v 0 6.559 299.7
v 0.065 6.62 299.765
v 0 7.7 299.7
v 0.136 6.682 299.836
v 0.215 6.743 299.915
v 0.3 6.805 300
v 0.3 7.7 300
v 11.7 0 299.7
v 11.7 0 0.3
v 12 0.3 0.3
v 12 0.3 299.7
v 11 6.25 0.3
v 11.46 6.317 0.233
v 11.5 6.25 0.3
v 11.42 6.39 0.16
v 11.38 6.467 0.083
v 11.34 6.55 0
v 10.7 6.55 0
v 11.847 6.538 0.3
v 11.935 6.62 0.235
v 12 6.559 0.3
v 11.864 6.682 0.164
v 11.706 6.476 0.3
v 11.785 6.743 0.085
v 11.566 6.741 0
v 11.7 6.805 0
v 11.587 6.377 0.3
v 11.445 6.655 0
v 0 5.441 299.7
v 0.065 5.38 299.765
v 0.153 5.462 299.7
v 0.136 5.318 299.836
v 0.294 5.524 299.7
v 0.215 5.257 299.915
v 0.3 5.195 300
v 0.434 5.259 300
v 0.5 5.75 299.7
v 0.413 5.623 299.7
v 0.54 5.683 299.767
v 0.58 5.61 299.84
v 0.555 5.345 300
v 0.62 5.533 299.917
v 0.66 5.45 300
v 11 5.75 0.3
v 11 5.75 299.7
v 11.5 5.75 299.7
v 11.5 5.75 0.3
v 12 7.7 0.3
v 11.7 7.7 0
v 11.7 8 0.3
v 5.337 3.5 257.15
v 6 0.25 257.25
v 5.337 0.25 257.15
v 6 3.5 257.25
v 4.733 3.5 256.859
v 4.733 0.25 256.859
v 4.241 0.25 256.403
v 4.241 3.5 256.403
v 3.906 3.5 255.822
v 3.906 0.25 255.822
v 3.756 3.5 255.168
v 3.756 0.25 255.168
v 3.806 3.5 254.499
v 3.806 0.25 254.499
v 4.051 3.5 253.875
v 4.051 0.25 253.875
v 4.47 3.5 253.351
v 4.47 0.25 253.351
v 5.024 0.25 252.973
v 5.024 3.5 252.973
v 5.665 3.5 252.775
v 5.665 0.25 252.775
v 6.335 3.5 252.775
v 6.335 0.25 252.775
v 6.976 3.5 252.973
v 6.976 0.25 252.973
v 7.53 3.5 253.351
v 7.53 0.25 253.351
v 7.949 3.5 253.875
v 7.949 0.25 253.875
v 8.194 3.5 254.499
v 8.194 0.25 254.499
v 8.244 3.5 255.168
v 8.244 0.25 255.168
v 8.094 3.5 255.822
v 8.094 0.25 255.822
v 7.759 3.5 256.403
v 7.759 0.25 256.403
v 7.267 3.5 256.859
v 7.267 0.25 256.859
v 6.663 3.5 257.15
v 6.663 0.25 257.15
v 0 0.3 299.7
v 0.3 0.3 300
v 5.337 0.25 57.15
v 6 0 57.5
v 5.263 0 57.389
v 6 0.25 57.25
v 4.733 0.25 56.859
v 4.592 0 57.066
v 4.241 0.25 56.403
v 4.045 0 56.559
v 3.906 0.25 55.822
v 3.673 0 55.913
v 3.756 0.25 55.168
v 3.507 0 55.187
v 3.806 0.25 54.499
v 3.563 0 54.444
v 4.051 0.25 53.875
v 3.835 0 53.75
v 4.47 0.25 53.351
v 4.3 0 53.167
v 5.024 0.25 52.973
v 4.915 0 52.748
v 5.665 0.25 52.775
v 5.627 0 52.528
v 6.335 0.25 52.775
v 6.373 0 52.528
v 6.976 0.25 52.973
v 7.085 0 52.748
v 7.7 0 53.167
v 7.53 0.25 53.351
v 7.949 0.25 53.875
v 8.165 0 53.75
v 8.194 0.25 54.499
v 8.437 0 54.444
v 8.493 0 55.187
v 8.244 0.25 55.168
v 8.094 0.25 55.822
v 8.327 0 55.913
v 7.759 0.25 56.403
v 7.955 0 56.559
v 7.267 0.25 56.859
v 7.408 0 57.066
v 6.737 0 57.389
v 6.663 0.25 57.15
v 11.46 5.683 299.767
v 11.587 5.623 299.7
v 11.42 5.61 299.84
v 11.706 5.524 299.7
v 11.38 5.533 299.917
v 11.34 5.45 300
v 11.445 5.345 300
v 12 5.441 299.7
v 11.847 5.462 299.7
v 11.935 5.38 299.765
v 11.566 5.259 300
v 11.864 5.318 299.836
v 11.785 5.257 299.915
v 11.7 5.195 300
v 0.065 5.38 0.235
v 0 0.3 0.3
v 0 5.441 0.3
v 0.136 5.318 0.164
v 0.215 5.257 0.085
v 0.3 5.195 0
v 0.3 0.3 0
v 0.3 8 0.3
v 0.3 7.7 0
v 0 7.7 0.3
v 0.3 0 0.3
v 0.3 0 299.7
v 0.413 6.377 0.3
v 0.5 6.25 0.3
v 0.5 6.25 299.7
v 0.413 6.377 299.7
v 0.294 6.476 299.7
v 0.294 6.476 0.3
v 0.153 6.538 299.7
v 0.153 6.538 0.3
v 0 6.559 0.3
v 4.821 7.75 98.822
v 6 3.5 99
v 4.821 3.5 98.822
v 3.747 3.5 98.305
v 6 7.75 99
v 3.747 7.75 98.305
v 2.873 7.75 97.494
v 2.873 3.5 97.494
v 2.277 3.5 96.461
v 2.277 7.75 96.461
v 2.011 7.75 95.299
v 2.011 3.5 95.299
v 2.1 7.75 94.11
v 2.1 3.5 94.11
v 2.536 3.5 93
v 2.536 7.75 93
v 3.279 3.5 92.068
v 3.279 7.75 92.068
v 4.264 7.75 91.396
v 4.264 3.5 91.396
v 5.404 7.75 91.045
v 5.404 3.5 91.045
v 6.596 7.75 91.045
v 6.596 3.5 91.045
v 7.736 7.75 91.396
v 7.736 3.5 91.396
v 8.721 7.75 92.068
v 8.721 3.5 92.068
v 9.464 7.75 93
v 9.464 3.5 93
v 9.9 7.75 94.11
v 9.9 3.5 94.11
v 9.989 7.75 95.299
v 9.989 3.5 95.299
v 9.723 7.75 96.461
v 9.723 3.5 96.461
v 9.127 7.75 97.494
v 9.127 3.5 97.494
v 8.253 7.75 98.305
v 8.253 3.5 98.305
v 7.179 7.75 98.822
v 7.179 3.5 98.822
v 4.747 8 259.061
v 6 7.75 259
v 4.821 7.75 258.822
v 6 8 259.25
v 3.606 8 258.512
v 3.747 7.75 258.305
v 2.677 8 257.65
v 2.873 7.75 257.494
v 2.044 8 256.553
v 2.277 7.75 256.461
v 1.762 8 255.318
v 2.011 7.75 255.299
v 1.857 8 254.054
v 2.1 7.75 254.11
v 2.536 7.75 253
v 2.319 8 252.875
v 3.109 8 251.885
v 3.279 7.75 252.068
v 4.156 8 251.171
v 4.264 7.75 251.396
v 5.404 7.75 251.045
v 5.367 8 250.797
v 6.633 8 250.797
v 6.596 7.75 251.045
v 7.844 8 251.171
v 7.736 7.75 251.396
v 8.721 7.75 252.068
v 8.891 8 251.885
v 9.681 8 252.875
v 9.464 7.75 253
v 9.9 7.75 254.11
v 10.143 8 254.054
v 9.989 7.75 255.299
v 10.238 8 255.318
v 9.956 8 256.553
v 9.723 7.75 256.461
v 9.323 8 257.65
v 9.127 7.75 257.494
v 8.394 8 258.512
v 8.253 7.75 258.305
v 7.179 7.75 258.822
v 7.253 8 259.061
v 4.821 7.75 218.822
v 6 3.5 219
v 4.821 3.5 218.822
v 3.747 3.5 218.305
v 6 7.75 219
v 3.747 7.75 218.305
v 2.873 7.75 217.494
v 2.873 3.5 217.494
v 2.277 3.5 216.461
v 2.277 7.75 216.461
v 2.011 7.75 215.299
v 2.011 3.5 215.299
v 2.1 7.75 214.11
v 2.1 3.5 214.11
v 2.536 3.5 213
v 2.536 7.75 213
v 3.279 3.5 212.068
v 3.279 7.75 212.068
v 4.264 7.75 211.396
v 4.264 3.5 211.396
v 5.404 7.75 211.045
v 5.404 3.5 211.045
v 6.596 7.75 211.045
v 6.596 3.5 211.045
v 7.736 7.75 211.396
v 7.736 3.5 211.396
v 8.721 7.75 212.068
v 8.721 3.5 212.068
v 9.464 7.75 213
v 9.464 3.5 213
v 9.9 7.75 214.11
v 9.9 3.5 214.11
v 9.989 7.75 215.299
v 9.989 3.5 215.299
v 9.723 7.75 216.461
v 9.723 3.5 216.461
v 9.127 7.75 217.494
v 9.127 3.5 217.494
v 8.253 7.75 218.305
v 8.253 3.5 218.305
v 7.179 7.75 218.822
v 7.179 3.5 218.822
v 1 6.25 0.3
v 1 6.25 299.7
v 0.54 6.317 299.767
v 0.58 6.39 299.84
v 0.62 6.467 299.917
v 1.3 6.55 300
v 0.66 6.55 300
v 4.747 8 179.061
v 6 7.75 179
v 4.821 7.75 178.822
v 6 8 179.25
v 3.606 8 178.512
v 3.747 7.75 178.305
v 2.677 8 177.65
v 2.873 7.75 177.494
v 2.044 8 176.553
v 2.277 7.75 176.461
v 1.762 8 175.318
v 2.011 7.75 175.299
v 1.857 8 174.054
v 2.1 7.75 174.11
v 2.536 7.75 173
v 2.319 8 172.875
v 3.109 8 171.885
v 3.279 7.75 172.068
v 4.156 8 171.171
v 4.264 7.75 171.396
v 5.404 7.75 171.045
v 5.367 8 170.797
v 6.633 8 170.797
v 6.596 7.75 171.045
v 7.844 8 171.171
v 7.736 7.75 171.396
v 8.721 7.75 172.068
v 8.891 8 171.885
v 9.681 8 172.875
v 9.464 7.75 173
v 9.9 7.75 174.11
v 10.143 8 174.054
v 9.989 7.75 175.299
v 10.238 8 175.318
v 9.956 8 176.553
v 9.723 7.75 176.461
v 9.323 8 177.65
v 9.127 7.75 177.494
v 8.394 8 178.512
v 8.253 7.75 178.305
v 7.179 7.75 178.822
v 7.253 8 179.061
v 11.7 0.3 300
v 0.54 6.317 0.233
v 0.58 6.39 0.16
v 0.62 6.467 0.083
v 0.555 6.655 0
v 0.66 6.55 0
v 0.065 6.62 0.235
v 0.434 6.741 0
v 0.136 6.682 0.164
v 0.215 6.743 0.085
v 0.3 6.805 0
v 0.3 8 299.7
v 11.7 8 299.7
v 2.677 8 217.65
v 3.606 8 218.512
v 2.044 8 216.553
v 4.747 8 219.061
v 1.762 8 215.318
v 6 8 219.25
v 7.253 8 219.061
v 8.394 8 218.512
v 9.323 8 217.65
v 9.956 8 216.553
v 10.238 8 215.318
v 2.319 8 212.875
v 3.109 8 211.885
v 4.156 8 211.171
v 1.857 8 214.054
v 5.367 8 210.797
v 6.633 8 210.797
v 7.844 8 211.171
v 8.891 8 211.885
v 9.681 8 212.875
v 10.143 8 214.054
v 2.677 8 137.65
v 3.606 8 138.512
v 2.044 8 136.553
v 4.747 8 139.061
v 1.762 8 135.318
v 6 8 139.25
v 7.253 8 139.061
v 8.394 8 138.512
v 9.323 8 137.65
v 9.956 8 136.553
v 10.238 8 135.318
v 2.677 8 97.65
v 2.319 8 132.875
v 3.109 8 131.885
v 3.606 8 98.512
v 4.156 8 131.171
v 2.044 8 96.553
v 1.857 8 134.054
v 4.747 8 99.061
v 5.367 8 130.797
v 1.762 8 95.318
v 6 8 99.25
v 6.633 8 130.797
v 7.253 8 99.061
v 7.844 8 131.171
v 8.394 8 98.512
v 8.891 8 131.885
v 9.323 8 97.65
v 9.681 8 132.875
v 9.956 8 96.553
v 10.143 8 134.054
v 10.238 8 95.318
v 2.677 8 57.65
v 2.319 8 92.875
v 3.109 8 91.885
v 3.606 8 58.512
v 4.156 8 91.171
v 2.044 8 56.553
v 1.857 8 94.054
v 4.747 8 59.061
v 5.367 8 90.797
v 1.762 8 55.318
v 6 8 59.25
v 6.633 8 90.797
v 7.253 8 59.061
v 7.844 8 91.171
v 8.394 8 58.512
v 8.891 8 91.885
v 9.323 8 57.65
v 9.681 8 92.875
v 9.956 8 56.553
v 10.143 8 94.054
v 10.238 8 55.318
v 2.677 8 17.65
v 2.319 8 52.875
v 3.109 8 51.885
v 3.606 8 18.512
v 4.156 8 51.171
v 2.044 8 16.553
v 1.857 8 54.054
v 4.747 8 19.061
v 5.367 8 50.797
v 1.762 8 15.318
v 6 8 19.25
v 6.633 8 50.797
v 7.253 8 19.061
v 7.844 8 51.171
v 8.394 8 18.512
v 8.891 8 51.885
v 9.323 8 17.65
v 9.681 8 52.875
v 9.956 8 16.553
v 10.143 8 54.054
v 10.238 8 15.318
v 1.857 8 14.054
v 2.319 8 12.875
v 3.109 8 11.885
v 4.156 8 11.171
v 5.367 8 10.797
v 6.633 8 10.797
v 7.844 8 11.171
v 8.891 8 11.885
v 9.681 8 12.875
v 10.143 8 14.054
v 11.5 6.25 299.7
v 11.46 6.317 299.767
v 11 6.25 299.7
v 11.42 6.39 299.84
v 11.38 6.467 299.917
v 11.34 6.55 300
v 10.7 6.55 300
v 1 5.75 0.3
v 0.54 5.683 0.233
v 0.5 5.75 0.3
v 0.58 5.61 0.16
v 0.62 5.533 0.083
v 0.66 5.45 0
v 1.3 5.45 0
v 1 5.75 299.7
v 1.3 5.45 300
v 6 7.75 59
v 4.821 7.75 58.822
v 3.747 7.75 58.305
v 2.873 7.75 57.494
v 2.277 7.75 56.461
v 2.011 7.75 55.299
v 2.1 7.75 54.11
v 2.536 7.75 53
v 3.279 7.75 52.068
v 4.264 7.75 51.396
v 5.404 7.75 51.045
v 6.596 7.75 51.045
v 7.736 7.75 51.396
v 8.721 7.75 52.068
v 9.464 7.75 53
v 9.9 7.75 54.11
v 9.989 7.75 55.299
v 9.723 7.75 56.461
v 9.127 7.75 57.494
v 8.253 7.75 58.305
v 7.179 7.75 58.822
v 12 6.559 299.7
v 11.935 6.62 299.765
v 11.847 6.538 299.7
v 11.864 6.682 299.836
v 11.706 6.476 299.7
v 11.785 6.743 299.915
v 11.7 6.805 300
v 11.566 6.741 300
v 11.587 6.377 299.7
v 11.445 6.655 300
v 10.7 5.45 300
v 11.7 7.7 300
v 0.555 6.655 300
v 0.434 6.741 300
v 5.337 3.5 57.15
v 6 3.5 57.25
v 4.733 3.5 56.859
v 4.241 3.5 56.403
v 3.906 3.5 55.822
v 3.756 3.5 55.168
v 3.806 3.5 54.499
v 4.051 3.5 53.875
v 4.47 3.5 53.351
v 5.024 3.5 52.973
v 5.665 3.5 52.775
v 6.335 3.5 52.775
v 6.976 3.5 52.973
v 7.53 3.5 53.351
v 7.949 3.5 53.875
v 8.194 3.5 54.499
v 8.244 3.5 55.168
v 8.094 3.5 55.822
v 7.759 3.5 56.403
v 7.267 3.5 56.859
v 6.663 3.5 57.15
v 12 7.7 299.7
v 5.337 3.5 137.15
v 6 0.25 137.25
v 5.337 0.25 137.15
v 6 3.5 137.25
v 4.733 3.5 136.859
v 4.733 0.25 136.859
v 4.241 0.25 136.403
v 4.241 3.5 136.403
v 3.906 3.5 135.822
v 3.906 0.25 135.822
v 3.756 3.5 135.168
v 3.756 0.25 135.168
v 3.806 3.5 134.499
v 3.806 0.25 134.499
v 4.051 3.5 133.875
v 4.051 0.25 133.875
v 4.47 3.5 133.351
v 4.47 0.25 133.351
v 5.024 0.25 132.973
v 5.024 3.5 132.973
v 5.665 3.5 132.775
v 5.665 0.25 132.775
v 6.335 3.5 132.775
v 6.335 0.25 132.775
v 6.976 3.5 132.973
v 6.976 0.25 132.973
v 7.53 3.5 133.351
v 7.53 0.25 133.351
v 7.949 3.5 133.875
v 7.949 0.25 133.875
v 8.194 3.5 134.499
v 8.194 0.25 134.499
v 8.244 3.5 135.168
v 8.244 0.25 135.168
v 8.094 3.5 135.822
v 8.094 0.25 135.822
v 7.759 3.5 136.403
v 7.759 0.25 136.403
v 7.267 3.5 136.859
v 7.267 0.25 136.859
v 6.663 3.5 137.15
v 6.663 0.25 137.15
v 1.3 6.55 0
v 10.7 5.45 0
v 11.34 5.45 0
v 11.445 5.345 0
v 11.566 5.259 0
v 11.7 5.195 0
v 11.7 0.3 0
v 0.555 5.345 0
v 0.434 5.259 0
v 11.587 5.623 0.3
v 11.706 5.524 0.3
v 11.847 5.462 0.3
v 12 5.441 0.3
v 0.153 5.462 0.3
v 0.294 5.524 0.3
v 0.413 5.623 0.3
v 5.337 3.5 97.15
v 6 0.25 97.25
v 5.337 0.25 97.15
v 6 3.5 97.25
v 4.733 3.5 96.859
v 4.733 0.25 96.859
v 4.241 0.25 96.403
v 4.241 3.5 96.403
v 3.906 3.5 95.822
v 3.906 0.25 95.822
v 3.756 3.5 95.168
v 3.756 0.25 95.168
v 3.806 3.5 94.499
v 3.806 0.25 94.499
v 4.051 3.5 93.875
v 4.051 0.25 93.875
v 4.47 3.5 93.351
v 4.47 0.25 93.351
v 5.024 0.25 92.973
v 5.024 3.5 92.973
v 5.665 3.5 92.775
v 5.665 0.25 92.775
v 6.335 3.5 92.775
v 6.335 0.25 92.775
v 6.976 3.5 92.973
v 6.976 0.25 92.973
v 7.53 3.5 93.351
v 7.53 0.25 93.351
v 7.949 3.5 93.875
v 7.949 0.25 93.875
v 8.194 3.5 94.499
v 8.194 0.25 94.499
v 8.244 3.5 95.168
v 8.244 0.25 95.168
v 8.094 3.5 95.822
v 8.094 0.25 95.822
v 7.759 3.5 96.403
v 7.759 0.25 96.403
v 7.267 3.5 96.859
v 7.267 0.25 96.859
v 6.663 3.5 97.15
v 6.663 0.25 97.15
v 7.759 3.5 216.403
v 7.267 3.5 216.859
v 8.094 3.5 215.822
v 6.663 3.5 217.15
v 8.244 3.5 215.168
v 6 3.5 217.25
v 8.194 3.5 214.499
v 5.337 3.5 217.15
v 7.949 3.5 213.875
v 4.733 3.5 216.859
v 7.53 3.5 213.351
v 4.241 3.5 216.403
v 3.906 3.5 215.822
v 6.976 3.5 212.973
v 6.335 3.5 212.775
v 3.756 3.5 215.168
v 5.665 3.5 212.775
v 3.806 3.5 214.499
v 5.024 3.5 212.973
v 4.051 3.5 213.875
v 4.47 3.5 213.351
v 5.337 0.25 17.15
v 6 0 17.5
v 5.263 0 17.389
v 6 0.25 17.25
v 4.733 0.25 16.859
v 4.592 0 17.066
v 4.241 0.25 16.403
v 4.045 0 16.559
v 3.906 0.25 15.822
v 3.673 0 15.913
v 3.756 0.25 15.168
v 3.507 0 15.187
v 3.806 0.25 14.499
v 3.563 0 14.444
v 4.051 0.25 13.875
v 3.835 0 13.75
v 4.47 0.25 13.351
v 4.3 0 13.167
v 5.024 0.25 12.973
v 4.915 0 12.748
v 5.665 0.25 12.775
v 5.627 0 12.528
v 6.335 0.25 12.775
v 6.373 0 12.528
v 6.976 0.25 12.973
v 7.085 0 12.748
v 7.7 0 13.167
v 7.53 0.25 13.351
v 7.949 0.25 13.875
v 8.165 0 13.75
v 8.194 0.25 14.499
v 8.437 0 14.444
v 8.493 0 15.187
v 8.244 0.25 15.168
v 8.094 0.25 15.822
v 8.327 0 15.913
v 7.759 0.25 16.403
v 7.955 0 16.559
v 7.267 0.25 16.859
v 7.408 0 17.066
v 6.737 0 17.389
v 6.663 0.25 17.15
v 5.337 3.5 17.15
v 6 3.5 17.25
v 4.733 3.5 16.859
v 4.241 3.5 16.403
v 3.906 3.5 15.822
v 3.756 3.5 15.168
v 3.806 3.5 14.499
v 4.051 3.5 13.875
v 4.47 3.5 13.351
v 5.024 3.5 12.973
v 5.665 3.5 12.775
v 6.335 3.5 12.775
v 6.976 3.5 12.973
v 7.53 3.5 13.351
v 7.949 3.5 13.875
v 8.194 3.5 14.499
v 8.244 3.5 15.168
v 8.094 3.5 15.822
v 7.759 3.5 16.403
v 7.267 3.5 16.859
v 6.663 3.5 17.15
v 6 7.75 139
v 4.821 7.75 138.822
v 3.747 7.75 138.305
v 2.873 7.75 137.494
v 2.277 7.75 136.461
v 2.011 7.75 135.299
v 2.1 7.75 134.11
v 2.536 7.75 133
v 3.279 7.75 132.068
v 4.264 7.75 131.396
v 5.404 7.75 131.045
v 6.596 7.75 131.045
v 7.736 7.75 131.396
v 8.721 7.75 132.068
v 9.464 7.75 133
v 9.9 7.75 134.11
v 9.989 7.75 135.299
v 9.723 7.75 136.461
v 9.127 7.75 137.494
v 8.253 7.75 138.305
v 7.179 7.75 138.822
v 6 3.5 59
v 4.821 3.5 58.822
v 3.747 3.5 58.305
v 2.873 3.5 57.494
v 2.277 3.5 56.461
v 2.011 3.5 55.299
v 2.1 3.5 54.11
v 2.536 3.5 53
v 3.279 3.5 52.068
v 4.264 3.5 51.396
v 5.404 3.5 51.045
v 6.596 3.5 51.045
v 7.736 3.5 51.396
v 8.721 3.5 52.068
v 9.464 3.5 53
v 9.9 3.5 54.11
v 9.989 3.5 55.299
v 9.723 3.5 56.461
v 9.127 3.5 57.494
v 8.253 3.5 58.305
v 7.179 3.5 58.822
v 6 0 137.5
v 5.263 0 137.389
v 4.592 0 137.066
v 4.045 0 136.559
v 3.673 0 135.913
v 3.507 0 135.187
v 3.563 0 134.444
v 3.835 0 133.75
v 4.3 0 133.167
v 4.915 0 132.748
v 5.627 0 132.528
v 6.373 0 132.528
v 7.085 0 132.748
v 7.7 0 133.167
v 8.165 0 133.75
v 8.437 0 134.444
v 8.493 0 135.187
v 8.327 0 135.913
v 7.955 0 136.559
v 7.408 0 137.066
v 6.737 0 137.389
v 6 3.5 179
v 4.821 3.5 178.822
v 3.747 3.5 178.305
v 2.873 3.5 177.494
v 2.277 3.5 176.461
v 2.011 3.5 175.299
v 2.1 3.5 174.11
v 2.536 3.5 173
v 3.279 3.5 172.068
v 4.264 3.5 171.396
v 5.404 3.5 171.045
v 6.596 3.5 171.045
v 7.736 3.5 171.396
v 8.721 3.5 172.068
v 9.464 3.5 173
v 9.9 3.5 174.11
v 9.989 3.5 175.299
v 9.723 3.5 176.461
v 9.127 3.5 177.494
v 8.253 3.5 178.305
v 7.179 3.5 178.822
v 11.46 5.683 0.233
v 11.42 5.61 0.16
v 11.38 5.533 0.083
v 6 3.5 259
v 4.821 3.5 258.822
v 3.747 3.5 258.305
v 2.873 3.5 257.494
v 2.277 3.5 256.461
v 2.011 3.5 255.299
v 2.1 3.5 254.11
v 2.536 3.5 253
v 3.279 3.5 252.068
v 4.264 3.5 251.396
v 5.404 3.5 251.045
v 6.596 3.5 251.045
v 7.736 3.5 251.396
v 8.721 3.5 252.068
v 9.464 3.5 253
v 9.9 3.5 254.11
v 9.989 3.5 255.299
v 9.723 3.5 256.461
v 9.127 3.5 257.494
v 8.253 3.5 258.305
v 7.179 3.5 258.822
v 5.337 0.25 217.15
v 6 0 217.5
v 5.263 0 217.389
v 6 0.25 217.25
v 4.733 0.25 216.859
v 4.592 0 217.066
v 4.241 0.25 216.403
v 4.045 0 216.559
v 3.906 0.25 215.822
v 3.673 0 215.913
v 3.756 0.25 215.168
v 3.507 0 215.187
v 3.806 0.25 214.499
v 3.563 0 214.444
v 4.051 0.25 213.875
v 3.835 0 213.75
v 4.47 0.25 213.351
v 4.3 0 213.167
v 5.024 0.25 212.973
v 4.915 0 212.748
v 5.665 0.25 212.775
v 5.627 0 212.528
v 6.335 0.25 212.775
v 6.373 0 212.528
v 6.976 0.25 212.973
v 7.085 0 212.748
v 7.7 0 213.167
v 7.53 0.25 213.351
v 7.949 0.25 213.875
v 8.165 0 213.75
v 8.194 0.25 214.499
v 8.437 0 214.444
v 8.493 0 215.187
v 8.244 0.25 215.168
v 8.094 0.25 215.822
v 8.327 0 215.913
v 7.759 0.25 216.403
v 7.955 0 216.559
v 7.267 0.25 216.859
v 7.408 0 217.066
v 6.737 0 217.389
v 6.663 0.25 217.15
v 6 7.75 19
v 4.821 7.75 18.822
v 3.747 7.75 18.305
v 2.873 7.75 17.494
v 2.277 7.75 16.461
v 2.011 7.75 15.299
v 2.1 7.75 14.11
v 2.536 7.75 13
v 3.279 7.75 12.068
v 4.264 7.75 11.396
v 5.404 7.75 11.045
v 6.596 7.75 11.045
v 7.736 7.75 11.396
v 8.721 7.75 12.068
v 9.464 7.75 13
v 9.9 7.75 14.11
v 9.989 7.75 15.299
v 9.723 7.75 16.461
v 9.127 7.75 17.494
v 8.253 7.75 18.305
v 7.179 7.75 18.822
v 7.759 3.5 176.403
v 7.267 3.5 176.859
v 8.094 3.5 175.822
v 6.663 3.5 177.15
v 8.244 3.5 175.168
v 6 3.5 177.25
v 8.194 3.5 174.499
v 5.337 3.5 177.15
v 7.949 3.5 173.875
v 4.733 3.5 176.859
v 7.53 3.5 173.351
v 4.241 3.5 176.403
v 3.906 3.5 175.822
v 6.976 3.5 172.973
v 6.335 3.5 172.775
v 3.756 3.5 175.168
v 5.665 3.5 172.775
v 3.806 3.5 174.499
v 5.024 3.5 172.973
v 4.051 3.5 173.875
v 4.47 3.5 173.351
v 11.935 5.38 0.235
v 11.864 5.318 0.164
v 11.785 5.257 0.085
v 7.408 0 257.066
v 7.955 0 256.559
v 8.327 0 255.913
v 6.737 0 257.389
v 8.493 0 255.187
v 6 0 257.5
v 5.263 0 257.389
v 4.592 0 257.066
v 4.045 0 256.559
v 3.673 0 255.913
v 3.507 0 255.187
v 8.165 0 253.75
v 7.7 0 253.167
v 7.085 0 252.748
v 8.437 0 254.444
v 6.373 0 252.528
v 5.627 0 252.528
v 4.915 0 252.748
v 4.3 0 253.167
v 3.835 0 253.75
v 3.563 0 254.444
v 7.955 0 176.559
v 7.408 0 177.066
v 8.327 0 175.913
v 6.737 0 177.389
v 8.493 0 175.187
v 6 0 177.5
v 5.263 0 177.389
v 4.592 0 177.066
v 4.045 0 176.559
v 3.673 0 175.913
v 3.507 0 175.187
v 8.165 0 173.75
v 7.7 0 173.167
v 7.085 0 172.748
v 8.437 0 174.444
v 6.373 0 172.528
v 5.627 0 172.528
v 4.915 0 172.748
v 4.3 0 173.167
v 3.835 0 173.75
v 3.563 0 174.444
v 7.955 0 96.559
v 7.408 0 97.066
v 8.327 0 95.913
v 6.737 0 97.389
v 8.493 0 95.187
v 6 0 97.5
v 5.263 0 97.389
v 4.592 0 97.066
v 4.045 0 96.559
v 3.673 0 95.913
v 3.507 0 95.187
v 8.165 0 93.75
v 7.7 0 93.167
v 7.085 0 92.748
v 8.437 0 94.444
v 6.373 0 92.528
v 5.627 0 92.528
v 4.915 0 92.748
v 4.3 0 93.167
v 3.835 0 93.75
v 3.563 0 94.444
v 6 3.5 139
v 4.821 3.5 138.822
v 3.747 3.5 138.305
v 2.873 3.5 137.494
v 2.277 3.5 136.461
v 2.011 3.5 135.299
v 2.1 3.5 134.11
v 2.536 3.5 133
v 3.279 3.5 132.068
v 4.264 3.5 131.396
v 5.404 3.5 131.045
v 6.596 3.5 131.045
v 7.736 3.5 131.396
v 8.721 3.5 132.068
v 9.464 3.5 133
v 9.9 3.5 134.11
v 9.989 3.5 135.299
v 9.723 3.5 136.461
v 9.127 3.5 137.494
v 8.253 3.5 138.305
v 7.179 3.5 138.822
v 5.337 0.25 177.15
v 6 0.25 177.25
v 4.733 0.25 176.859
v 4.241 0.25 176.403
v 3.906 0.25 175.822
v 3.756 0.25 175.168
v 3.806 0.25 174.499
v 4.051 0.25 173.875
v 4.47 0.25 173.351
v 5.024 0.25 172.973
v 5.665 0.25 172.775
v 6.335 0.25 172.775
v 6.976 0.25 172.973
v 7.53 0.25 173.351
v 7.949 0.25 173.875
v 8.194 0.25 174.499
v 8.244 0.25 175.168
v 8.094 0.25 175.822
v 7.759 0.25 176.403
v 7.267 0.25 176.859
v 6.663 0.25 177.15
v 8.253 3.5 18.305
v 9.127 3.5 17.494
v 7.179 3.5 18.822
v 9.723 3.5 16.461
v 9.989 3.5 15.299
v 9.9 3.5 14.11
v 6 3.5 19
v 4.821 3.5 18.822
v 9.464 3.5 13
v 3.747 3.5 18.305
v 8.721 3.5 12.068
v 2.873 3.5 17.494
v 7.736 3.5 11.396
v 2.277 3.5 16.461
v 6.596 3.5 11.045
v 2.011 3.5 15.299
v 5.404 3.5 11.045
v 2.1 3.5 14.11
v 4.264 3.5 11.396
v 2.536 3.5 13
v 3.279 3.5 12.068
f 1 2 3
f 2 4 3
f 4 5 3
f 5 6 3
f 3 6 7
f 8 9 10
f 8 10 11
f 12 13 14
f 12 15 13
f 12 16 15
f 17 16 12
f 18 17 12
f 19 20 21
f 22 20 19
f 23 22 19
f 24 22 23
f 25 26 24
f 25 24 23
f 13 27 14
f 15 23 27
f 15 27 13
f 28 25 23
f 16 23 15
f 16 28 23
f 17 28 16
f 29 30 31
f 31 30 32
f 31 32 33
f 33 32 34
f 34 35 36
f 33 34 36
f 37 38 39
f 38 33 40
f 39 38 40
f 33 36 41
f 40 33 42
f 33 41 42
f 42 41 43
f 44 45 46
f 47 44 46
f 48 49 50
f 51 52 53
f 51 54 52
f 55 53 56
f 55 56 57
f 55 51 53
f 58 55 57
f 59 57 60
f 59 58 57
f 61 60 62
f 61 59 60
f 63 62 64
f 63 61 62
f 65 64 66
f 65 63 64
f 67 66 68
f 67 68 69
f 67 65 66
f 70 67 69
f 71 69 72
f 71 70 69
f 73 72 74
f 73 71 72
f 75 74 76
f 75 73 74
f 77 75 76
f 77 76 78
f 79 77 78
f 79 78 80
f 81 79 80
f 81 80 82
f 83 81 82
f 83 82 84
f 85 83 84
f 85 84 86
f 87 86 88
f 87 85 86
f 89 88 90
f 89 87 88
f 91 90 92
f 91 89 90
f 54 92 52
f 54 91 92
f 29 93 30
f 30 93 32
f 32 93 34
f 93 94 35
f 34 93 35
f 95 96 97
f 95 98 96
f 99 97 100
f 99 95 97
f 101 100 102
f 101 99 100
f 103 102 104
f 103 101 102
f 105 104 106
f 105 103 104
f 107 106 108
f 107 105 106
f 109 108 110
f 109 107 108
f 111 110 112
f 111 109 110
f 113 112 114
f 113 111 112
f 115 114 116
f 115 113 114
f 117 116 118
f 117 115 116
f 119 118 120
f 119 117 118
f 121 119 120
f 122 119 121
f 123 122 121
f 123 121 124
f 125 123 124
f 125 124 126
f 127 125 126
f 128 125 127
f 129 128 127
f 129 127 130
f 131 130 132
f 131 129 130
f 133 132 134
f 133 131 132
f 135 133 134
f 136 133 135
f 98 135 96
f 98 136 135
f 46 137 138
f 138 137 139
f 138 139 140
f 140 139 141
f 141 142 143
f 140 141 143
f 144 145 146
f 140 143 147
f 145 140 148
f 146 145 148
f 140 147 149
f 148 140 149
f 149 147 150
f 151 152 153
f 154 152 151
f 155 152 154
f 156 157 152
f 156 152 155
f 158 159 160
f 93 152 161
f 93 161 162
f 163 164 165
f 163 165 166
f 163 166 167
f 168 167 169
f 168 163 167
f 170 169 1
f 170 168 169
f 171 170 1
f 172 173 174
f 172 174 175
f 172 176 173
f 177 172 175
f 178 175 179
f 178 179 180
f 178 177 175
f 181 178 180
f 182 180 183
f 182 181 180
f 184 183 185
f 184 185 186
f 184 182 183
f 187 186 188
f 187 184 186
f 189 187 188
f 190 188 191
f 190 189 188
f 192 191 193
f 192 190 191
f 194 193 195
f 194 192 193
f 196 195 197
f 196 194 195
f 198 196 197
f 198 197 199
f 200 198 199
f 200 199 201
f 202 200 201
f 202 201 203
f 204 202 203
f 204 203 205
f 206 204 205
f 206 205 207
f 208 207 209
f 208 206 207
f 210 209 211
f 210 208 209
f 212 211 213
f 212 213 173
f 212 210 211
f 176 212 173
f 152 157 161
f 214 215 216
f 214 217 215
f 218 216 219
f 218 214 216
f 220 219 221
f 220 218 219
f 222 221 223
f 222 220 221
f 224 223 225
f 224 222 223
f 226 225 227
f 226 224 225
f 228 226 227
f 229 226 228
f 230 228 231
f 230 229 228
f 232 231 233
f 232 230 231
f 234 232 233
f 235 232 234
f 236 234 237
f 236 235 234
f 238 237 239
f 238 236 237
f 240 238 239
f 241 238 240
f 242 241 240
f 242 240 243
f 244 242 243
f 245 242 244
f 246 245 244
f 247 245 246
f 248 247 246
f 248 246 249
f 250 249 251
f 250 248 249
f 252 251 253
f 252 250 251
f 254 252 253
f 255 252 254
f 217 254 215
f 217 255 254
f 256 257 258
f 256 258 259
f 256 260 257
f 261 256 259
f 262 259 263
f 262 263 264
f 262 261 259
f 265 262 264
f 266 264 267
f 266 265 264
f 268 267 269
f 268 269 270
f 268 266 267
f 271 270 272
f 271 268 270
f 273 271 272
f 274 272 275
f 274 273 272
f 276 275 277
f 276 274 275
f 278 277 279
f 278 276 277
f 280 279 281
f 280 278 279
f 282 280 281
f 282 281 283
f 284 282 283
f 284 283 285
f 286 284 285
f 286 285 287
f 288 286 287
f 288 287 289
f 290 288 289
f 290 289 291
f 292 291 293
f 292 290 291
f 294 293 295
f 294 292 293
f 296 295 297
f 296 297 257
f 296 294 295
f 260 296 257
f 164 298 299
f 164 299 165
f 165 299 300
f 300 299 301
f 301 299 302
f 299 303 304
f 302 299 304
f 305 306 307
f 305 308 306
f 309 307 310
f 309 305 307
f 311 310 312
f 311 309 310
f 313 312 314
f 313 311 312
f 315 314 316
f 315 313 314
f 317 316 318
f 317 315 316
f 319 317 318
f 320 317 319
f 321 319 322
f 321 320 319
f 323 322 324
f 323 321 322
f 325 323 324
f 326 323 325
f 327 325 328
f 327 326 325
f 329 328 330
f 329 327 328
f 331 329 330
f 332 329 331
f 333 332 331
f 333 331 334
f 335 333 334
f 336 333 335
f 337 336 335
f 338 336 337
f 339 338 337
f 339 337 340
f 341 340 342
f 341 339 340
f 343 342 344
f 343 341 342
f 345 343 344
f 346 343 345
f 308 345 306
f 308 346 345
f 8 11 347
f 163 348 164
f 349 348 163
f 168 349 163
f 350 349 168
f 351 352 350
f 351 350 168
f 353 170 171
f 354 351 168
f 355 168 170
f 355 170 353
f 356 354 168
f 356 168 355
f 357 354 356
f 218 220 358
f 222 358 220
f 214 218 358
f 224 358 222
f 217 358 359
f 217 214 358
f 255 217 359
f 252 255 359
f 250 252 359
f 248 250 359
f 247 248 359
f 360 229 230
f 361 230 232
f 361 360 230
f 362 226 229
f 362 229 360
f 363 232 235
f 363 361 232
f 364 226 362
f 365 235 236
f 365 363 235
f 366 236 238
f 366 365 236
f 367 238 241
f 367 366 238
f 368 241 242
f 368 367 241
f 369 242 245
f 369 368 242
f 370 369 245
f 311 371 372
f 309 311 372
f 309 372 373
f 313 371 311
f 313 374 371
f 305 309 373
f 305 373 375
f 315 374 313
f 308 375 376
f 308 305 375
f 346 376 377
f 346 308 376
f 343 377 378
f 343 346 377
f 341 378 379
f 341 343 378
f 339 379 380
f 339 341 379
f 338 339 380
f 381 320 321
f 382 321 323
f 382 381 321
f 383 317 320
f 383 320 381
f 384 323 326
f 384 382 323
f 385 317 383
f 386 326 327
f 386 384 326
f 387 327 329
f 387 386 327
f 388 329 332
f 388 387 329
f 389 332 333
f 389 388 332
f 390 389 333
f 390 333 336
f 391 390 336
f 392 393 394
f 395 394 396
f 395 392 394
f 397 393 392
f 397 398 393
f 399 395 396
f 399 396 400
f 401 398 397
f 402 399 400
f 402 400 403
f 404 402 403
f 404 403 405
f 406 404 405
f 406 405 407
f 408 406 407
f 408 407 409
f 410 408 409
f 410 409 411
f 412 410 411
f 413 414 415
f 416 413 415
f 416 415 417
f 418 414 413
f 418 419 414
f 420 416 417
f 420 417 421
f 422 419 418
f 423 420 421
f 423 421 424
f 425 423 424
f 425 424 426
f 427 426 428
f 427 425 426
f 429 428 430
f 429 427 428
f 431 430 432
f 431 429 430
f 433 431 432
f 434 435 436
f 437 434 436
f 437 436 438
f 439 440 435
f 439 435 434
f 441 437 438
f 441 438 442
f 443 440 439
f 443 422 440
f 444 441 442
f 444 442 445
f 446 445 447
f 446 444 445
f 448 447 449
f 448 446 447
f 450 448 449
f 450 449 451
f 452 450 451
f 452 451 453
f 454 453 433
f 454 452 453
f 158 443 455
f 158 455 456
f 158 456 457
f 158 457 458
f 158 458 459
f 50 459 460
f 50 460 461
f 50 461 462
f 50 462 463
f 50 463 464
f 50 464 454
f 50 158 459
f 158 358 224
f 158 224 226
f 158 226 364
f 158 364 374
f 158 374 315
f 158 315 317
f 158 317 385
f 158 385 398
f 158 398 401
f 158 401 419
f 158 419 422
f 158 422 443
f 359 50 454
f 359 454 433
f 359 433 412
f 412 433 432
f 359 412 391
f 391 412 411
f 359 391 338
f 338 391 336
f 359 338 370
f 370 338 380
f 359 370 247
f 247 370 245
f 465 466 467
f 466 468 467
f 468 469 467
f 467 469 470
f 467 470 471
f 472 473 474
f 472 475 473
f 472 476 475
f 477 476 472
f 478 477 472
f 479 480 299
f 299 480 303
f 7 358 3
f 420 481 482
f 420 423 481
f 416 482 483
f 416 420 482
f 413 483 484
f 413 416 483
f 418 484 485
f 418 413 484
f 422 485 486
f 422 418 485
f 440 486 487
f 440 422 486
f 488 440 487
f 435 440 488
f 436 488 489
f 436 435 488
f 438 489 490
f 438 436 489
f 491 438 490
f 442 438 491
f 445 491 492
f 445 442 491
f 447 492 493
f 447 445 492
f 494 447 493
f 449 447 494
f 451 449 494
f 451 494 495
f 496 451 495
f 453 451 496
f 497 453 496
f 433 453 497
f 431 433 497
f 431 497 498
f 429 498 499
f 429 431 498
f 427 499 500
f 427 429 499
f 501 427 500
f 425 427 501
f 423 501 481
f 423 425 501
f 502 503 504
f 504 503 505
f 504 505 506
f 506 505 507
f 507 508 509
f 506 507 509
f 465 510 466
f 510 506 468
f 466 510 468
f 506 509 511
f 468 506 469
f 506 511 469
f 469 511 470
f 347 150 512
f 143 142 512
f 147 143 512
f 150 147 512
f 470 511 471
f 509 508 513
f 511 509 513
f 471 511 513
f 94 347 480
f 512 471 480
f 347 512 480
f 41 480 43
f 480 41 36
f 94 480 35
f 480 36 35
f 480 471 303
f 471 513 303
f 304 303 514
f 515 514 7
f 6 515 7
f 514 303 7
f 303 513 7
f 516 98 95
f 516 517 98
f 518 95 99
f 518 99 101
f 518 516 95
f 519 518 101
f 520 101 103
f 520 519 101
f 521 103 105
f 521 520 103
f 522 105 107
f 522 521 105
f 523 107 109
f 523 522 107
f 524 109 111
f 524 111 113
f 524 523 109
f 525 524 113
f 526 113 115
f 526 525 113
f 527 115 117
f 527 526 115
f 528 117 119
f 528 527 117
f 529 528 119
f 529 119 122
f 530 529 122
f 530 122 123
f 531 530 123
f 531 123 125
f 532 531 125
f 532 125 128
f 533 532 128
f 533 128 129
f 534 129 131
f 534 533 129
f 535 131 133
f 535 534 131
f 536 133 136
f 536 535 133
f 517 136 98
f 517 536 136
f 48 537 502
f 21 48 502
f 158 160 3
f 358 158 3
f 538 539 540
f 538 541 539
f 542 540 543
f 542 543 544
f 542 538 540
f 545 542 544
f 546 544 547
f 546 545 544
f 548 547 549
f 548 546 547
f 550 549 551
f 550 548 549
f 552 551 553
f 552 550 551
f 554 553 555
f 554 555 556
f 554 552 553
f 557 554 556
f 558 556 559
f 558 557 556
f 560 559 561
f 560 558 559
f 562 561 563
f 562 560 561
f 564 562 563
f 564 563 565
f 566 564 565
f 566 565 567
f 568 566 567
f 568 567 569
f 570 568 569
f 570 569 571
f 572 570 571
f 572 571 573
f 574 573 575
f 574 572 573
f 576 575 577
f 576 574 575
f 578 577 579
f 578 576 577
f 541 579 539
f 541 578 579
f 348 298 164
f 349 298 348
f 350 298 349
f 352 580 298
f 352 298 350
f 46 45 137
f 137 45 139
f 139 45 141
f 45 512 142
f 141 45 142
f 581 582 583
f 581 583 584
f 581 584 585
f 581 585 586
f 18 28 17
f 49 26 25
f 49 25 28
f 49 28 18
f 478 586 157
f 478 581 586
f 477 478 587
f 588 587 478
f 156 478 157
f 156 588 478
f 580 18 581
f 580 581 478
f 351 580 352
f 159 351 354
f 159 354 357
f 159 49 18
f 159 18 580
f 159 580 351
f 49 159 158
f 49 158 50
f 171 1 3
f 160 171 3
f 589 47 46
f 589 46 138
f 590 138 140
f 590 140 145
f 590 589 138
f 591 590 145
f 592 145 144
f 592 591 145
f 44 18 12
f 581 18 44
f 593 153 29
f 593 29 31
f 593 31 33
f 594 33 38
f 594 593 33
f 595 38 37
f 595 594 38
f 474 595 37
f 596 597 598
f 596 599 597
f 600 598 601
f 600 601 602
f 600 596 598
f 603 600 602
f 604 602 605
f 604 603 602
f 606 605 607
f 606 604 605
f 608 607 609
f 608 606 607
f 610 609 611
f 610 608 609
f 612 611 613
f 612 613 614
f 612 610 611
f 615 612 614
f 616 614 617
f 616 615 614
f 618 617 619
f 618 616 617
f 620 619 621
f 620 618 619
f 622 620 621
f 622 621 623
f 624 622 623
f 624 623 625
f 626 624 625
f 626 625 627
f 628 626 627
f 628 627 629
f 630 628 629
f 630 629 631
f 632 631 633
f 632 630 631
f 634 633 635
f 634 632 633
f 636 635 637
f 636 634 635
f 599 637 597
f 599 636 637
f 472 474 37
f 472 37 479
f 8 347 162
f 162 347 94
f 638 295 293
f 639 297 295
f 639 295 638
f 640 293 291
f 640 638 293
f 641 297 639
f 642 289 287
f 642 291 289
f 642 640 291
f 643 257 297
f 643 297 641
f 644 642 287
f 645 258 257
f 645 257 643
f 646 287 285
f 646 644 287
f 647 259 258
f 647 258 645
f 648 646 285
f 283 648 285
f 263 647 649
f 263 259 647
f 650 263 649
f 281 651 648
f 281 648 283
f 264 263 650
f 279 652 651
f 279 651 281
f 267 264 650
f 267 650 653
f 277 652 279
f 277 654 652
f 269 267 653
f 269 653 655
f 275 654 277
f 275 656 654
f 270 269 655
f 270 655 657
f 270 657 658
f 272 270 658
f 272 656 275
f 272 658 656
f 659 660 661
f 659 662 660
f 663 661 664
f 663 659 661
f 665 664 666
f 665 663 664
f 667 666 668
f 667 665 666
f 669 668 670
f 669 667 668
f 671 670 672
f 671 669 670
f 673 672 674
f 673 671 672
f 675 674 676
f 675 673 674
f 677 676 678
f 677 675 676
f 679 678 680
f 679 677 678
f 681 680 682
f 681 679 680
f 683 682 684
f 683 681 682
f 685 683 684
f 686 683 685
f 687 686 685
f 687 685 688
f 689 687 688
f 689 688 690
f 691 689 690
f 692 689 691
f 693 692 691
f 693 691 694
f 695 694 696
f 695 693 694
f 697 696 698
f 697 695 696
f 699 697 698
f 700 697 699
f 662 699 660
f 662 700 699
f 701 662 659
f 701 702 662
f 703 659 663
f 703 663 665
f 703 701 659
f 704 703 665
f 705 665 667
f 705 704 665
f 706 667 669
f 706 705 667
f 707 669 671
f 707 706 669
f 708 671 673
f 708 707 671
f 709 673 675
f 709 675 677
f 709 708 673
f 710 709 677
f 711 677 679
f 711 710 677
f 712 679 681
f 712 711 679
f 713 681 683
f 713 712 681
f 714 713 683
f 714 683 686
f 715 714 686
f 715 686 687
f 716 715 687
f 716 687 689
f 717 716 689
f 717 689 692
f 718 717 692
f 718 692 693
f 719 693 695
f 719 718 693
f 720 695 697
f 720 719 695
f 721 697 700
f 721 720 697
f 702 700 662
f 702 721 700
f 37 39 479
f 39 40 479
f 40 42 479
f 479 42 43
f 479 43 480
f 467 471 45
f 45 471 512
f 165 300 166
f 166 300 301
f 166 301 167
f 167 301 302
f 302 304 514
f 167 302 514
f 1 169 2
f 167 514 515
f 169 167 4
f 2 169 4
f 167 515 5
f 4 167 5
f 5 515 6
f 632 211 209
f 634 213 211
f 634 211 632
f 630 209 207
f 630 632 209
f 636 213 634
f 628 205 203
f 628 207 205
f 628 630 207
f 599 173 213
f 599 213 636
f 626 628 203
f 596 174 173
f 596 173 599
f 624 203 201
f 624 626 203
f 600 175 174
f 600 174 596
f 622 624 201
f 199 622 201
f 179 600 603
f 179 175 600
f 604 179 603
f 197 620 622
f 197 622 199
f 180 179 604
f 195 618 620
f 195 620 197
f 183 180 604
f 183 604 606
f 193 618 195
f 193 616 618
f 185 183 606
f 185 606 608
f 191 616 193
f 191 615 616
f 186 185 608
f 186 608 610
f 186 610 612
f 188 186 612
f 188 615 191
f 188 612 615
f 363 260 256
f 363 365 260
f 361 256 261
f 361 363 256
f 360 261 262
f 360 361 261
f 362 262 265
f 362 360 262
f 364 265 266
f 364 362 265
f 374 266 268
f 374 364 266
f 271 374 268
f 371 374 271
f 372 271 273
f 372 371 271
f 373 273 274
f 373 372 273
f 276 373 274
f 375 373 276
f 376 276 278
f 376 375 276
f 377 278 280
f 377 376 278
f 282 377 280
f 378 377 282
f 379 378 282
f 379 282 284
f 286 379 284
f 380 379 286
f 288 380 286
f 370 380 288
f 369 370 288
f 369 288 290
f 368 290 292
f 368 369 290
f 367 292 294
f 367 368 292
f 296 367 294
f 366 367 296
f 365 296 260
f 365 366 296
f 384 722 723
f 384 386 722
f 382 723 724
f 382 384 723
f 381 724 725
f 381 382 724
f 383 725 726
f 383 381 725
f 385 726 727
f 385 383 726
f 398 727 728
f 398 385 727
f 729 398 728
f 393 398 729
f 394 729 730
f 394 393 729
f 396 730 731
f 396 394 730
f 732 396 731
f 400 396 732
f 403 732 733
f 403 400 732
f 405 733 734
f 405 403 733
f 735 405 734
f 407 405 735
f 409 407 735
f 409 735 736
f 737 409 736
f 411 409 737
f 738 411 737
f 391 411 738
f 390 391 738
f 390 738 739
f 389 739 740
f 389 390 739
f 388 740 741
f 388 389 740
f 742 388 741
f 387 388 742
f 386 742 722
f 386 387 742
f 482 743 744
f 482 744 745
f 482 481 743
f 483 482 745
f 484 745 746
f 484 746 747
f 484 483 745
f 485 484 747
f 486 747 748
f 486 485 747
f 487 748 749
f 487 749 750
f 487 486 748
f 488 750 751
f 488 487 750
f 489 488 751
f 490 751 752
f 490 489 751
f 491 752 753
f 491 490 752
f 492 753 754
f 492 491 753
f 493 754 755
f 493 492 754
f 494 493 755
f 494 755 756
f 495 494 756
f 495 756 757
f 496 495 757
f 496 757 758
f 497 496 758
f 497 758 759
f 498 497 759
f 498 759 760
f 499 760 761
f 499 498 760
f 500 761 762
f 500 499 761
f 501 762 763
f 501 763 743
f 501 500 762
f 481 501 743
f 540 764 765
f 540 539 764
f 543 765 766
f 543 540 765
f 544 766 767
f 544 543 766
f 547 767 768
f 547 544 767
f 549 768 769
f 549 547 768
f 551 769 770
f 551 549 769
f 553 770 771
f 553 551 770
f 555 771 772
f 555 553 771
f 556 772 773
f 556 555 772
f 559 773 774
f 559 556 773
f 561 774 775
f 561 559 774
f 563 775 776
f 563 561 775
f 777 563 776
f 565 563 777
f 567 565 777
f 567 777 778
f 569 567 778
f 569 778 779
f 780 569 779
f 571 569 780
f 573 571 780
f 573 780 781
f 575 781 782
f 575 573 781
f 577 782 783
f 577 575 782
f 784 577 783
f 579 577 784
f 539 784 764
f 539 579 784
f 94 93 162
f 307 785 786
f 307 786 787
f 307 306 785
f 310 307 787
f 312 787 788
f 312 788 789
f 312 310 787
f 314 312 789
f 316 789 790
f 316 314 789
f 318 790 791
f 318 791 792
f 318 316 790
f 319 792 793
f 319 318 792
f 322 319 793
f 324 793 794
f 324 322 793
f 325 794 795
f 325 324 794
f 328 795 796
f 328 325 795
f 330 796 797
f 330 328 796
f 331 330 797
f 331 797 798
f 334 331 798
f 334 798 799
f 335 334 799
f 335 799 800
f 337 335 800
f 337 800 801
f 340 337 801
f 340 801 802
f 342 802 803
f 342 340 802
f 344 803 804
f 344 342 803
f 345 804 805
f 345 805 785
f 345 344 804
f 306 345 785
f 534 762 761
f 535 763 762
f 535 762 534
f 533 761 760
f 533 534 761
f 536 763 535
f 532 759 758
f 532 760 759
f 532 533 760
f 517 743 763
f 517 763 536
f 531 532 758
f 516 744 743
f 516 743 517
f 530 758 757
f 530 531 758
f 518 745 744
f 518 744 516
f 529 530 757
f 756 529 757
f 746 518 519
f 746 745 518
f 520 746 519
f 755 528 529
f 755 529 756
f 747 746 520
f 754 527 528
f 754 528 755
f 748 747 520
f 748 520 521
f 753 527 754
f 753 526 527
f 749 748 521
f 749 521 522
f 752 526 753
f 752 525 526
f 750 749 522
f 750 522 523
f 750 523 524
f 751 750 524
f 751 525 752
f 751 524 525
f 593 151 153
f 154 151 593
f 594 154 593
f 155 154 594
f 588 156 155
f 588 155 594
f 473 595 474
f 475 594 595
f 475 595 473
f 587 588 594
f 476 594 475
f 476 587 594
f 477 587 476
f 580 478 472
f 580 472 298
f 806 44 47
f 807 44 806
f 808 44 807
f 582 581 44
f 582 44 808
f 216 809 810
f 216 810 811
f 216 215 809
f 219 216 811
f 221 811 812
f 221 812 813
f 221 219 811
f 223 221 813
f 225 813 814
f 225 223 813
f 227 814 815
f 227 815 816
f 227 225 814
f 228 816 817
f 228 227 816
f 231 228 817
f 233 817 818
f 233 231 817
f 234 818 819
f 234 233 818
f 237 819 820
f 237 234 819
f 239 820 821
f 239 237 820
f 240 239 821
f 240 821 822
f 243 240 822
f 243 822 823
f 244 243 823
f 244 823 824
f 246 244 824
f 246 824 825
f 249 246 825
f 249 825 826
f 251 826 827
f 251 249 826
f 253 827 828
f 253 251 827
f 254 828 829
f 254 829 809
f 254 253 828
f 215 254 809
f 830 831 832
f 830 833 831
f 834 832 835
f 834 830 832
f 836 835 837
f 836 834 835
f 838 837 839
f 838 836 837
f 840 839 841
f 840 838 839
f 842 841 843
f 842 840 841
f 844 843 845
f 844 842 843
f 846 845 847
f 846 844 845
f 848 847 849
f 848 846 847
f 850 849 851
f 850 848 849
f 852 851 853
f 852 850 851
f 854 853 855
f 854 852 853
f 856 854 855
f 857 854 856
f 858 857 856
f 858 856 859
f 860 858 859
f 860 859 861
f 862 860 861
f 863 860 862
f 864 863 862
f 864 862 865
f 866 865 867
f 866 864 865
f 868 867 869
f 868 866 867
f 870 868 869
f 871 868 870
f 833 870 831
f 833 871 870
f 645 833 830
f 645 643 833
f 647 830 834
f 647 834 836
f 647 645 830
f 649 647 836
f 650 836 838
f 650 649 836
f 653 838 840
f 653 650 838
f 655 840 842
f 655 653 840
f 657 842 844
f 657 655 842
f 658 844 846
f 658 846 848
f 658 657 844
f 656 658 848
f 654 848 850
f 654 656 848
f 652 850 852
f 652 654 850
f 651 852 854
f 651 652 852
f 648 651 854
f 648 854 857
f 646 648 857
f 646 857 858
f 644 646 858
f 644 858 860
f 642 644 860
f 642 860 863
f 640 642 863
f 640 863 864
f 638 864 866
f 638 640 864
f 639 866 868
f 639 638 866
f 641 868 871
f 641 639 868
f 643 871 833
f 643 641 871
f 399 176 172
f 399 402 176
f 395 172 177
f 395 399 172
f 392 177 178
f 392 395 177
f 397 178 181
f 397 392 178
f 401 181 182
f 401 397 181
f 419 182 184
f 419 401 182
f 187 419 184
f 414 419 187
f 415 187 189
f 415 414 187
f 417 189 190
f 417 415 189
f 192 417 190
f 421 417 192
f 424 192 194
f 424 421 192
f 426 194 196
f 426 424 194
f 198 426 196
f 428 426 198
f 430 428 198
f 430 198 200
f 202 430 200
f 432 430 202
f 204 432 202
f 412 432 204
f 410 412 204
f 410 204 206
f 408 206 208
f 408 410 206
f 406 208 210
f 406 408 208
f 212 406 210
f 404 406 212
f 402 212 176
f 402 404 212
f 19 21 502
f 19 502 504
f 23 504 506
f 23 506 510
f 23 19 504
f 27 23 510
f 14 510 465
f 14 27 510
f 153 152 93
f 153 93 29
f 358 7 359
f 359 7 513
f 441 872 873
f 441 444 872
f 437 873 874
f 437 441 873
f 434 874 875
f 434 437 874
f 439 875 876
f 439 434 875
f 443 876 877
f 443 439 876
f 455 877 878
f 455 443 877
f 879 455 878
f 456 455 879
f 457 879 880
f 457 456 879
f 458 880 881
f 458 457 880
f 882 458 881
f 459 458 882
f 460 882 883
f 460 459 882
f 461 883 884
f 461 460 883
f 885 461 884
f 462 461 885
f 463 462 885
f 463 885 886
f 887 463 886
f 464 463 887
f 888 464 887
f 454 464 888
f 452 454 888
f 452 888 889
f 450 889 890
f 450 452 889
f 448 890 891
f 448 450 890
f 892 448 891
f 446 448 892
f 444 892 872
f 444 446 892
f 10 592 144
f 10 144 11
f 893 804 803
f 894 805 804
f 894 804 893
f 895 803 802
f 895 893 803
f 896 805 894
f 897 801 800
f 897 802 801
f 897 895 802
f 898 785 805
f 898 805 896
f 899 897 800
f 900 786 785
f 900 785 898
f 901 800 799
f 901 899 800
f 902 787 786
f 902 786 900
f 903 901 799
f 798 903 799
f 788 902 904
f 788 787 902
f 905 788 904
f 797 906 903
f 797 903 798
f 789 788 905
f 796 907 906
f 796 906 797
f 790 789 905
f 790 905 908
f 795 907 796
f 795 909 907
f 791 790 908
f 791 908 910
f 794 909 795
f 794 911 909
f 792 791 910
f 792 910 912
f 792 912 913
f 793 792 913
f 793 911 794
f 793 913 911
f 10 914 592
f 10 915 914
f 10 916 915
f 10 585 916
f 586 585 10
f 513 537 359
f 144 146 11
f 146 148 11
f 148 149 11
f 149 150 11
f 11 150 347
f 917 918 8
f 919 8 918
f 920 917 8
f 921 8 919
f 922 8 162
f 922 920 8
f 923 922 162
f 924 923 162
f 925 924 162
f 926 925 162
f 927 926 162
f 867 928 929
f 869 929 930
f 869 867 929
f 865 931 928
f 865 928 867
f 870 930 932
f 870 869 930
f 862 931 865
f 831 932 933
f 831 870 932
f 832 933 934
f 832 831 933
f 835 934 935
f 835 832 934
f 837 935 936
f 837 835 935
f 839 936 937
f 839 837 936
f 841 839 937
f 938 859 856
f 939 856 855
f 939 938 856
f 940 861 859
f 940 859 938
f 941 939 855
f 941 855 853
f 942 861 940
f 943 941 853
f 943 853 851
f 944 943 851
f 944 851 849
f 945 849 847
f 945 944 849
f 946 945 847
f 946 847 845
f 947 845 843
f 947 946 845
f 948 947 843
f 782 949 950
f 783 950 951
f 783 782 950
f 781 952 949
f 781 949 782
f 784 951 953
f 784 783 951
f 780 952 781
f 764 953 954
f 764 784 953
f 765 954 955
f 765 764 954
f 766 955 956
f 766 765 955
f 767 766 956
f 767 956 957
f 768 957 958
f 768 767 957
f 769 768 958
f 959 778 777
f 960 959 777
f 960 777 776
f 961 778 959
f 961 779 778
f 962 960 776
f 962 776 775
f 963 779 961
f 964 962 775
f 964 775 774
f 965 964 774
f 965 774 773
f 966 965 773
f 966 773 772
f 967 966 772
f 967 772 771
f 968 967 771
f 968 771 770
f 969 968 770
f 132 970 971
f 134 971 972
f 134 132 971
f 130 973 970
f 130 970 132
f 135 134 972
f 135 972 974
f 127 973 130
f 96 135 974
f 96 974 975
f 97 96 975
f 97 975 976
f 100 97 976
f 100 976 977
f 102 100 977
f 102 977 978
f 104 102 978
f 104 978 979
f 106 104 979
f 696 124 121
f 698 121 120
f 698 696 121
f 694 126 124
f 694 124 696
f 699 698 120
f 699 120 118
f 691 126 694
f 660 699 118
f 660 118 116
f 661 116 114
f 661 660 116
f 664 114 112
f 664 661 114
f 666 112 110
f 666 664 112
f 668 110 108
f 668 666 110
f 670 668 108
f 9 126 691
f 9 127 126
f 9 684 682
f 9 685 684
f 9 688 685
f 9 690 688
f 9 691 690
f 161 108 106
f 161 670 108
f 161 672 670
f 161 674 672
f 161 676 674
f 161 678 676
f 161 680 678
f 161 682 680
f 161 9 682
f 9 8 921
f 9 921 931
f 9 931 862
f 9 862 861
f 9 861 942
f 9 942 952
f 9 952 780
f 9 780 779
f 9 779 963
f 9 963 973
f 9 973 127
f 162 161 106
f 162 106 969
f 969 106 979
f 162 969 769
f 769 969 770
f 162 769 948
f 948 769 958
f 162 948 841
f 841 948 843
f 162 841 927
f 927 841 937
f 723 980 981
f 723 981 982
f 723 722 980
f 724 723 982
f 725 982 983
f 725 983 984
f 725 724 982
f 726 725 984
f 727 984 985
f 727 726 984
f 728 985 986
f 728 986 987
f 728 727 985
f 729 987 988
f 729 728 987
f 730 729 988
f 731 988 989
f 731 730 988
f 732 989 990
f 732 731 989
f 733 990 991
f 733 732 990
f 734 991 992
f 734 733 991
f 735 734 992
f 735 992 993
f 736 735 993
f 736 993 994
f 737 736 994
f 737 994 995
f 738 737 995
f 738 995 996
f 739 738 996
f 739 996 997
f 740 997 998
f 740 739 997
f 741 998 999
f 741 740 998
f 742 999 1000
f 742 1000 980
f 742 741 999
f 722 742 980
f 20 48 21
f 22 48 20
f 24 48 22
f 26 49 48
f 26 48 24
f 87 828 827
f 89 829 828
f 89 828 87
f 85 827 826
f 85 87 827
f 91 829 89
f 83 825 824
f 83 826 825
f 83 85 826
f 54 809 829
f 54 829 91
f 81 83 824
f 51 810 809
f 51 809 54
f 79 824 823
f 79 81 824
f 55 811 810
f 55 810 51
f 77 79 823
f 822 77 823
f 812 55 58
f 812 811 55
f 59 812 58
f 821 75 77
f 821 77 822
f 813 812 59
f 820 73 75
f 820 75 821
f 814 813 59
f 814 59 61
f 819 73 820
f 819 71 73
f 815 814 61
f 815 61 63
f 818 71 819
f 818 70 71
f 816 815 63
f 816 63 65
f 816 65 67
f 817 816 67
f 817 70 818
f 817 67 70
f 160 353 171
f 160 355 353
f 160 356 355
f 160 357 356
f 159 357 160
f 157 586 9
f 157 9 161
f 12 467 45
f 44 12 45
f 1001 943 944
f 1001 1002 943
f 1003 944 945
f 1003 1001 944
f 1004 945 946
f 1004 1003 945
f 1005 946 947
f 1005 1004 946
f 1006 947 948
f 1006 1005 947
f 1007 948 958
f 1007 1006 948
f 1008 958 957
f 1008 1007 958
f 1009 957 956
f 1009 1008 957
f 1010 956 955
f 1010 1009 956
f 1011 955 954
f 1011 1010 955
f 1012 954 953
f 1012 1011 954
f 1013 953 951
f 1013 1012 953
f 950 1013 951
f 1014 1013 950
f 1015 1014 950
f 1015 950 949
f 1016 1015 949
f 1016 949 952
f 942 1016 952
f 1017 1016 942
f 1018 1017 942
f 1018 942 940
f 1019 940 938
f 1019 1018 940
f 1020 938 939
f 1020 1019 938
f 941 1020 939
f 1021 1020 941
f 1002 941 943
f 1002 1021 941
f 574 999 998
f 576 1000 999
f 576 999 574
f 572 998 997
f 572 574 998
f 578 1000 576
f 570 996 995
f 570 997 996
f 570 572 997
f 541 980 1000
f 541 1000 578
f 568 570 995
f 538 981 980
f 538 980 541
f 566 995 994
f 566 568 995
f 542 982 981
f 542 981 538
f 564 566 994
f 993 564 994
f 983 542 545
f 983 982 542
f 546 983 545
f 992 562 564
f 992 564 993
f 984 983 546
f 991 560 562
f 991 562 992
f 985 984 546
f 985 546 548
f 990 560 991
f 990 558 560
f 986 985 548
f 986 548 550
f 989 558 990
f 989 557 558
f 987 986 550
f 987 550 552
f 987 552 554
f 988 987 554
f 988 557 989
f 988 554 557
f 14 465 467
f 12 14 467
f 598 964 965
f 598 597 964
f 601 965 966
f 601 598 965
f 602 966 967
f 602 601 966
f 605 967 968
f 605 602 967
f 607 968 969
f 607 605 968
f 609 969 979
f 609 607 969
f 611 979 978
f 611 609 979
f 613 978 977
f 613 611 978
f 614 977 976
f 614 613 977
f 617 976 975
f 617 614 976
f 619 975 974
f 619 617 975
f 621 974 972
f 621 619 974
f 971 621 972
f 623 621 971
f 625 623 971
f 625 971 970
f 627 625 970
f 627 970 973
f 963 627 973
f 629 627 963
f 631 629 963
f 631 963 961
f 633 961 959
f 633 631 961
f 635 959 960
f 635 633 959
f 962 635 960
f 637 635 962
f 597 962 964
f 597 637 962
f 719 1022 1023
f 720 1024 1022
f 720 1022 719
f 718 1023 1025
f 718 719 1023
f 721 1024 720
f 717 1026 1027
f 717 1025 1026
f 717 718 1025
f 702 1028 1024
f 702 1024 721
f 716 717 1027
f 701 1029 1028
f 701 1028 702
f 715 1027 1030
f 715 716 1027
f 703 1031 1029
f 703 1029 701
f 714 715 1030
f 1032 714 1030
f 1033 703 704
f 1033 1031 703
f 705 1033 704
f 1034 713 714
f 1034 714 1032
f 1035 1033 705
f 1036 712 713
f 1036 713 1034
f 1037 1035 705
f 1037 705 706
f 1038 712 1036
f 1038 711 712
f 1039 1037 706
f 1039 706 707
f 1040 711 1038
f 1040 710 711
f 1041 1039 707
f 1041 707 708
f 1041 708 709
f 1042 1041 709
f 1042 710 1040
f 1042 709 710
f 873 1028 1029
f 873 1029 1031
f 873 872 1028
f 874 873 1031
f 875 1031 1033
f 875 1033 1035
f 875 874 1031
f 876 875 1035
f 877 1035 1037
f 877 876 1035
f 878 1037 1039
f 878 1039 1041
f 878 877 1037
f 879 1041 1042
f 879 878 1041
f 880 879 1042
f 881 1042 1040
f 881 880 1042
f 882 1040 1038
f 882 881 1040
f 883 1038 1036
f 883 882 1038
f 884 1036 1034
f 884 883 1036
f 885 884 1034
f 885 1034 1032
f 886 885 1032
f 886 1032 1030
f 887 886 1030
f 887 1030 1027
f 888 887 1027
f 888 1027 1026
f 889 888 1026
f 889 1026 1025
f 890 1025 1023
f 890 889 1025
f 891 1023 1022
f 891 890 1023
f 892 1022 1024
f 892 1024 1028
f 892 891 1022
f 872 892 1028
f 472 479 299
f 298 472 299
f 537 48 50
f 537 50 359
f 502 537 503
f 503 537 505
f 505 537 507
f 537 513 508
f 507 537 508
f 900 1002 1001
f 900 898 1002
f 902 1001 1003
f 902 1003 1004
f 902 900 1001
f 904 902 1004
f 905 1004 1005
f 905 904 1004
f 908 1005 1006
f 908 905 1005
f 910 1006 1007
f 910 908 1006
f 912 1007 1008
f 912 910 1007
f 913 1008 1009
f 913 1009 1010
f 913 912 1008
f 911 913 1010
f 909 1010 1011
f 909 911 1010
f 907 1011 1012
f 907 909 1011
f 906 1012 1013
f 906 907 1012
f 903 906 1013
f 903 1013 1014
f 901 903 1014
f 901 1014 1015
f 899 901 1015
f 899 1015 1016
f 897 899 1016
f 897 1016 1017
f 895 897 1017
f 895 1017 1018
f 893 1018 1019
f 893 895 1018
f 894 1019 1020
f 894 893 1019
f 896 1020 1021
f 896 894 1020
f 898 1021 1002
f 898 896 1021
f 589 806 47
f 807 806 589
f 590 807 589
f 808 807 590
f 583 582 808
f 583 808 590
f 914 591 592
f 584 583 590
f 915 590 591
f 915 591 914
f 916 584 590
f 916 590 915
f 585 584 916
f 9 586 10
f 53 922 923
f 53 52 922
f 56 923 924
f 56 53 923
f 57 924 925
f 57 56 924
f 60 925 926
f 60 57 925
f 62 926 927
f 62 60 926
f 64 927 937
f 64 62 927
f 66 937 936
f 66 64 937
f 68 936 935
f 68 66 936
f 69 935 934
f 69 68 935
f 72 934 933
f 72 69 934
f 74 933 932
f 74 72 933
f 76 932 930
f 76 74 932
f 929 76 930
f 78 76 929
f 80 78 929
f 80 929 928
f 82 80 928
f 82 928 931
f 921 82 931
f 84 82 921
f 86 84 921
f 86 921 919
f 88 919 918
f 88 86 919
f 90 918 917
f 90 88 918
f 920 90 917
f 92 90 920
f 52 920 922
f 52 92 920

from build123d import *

# Parameters (mm, degrees)
BOSS_EXTRUDE1_DEPTH = 300
CHAMFER1_SIZE       = 0.3
LPATTERN1_COUNT     = 7
LPATTERN1_PITCH     = 40


with BuildPart() as part:
    # Sketch1 → Boss-Extrude1 (new body)
    with BuildSketch(Plane.XY):
        with BuildLine():
            Line((0, 8), (12, 8))
            Line((12, 8), (12, 6.75))
            Line((12, 6.75), (12, 6.559016994))
            ThreePointArc((12, 6.559016994), (11.706107374, 6.475528258), (11.5, 6.25))
            Line((11.5, 6.25), (11, 6.25))
            Line((11, 6.25), (11, 5.75))
            Line((11, 5.75), (11.5, 5.75))
            ThreePointArc((11.5, 5.75), (11.706107374, 5.524471742), (12, 5.440983006))
            Line((12, 5.440983006), (12, 5.25))
            Line((12, 5.25), (12, 0))
            Line((12, 0), (0, 0))
            Line((0, 0), (0, 5.25))
            Line((0, 5.25), (0, 5.440983006))
            ThreePointArc((0, 5.440983006), (0.293892626, 5.524471742), (0.5, 5.75))
            Line((0.5, 5.75), (1, 5.75))
            Line((1, 5.75), (1, 6.25))
            Line((1, 6.25), (0.5, 6.25))
            ThreePointArc((0.5, 6.25), (0.293892626, 6.475528258), (0, 6.559016994))
            Line((0, 6.559016994), (0, 6.75))
            Line((0, 6.75), (0, 8))
        make_face()
    extrude(amount=BOSS_EXTRUDE1_DEPTH)

    # Chamfer1
    chamfer1_edges = [part.edges().sort_by_distance(p)[0] for p in [
        (12, 2.720491503, 300),
        (11.706107374, 5.524471742, 300),
        (0, 2.720491503, 0),
        (0.293892626, 5.524471742, 0),
        (0.75, 5.75, 0),
        (1, 6, 0),
        (0.75, 6.25, 0),
        (11.25, 5.75, 300),
        (0.293892626, 6.475528258, 0),
        (0, 7.279508497, 0),
        (6, 8, 0),
        (12, 7.279508497, 0),
        (11.706107374, 6.475528258, 0),
        (11, 6, 300),
        (11.25, 6.25, 0),
        (11, 6, 0),
        (11.25, 5.75, 0),
        (11.706107374, 5.524471742, 0),
        (12, 2.720491503, 0),
        (6, 0, 0),
        (11.25, 6.25, 300),
        (11.706107374, 6.475528258, 300),
        (12, 7.279508497, 300),
        (0, 8, 150),
        (12, 8, 150),
        (12, 0, 150),
        (0, 0, 150),
        (6, 8, 300),
        (0, 2.720491503, 300),
        (0, 7.279508497, 300),
        (0.293892626, 6.475528258, 300),
        (0.75, 6.25, 300),
        (1, 6, 300),
        (0.75, 5.75, 300),
        (0.293892626, 5.524471742, 300),
        (6, 0, 300),
    ]]
    chamfer(chamfer1_edges, length=CHAMFER1_SIZE)

    # Sketch3 → CBORE for M5 Hex Head Bolt1 (revolve, cut)
    with BuildSketch(Plane(origin=(6, 8, 15), x_dir=(0, 0, 1), z_dir=(1, 0, 0))):
        Polygon((0, 0), (0, 8), (2.5, 8), (2.25, 7.75), (2.25, 4.5), (4, 4.5), (4, 0.25), (4.25, 0), align=None)
    cbore_for_m5_hex_head_bolt1 = revolve(axis=Axis((6, 14.35, 15), (0, -1, 0)), mode=Mode.SUBTRACT)

    # LPattern1: CBORE for M5 Hex Head Bolt1 ×7
    with Locations(*[(0, 0, i * LPATTERN1_PITCH) for i in range(1, LPATTERN1_COUNT)]):
        add(cbore_for_m5_hex_head_bolt1, mode=Mode.SUBTRACT)


solid = part.part
